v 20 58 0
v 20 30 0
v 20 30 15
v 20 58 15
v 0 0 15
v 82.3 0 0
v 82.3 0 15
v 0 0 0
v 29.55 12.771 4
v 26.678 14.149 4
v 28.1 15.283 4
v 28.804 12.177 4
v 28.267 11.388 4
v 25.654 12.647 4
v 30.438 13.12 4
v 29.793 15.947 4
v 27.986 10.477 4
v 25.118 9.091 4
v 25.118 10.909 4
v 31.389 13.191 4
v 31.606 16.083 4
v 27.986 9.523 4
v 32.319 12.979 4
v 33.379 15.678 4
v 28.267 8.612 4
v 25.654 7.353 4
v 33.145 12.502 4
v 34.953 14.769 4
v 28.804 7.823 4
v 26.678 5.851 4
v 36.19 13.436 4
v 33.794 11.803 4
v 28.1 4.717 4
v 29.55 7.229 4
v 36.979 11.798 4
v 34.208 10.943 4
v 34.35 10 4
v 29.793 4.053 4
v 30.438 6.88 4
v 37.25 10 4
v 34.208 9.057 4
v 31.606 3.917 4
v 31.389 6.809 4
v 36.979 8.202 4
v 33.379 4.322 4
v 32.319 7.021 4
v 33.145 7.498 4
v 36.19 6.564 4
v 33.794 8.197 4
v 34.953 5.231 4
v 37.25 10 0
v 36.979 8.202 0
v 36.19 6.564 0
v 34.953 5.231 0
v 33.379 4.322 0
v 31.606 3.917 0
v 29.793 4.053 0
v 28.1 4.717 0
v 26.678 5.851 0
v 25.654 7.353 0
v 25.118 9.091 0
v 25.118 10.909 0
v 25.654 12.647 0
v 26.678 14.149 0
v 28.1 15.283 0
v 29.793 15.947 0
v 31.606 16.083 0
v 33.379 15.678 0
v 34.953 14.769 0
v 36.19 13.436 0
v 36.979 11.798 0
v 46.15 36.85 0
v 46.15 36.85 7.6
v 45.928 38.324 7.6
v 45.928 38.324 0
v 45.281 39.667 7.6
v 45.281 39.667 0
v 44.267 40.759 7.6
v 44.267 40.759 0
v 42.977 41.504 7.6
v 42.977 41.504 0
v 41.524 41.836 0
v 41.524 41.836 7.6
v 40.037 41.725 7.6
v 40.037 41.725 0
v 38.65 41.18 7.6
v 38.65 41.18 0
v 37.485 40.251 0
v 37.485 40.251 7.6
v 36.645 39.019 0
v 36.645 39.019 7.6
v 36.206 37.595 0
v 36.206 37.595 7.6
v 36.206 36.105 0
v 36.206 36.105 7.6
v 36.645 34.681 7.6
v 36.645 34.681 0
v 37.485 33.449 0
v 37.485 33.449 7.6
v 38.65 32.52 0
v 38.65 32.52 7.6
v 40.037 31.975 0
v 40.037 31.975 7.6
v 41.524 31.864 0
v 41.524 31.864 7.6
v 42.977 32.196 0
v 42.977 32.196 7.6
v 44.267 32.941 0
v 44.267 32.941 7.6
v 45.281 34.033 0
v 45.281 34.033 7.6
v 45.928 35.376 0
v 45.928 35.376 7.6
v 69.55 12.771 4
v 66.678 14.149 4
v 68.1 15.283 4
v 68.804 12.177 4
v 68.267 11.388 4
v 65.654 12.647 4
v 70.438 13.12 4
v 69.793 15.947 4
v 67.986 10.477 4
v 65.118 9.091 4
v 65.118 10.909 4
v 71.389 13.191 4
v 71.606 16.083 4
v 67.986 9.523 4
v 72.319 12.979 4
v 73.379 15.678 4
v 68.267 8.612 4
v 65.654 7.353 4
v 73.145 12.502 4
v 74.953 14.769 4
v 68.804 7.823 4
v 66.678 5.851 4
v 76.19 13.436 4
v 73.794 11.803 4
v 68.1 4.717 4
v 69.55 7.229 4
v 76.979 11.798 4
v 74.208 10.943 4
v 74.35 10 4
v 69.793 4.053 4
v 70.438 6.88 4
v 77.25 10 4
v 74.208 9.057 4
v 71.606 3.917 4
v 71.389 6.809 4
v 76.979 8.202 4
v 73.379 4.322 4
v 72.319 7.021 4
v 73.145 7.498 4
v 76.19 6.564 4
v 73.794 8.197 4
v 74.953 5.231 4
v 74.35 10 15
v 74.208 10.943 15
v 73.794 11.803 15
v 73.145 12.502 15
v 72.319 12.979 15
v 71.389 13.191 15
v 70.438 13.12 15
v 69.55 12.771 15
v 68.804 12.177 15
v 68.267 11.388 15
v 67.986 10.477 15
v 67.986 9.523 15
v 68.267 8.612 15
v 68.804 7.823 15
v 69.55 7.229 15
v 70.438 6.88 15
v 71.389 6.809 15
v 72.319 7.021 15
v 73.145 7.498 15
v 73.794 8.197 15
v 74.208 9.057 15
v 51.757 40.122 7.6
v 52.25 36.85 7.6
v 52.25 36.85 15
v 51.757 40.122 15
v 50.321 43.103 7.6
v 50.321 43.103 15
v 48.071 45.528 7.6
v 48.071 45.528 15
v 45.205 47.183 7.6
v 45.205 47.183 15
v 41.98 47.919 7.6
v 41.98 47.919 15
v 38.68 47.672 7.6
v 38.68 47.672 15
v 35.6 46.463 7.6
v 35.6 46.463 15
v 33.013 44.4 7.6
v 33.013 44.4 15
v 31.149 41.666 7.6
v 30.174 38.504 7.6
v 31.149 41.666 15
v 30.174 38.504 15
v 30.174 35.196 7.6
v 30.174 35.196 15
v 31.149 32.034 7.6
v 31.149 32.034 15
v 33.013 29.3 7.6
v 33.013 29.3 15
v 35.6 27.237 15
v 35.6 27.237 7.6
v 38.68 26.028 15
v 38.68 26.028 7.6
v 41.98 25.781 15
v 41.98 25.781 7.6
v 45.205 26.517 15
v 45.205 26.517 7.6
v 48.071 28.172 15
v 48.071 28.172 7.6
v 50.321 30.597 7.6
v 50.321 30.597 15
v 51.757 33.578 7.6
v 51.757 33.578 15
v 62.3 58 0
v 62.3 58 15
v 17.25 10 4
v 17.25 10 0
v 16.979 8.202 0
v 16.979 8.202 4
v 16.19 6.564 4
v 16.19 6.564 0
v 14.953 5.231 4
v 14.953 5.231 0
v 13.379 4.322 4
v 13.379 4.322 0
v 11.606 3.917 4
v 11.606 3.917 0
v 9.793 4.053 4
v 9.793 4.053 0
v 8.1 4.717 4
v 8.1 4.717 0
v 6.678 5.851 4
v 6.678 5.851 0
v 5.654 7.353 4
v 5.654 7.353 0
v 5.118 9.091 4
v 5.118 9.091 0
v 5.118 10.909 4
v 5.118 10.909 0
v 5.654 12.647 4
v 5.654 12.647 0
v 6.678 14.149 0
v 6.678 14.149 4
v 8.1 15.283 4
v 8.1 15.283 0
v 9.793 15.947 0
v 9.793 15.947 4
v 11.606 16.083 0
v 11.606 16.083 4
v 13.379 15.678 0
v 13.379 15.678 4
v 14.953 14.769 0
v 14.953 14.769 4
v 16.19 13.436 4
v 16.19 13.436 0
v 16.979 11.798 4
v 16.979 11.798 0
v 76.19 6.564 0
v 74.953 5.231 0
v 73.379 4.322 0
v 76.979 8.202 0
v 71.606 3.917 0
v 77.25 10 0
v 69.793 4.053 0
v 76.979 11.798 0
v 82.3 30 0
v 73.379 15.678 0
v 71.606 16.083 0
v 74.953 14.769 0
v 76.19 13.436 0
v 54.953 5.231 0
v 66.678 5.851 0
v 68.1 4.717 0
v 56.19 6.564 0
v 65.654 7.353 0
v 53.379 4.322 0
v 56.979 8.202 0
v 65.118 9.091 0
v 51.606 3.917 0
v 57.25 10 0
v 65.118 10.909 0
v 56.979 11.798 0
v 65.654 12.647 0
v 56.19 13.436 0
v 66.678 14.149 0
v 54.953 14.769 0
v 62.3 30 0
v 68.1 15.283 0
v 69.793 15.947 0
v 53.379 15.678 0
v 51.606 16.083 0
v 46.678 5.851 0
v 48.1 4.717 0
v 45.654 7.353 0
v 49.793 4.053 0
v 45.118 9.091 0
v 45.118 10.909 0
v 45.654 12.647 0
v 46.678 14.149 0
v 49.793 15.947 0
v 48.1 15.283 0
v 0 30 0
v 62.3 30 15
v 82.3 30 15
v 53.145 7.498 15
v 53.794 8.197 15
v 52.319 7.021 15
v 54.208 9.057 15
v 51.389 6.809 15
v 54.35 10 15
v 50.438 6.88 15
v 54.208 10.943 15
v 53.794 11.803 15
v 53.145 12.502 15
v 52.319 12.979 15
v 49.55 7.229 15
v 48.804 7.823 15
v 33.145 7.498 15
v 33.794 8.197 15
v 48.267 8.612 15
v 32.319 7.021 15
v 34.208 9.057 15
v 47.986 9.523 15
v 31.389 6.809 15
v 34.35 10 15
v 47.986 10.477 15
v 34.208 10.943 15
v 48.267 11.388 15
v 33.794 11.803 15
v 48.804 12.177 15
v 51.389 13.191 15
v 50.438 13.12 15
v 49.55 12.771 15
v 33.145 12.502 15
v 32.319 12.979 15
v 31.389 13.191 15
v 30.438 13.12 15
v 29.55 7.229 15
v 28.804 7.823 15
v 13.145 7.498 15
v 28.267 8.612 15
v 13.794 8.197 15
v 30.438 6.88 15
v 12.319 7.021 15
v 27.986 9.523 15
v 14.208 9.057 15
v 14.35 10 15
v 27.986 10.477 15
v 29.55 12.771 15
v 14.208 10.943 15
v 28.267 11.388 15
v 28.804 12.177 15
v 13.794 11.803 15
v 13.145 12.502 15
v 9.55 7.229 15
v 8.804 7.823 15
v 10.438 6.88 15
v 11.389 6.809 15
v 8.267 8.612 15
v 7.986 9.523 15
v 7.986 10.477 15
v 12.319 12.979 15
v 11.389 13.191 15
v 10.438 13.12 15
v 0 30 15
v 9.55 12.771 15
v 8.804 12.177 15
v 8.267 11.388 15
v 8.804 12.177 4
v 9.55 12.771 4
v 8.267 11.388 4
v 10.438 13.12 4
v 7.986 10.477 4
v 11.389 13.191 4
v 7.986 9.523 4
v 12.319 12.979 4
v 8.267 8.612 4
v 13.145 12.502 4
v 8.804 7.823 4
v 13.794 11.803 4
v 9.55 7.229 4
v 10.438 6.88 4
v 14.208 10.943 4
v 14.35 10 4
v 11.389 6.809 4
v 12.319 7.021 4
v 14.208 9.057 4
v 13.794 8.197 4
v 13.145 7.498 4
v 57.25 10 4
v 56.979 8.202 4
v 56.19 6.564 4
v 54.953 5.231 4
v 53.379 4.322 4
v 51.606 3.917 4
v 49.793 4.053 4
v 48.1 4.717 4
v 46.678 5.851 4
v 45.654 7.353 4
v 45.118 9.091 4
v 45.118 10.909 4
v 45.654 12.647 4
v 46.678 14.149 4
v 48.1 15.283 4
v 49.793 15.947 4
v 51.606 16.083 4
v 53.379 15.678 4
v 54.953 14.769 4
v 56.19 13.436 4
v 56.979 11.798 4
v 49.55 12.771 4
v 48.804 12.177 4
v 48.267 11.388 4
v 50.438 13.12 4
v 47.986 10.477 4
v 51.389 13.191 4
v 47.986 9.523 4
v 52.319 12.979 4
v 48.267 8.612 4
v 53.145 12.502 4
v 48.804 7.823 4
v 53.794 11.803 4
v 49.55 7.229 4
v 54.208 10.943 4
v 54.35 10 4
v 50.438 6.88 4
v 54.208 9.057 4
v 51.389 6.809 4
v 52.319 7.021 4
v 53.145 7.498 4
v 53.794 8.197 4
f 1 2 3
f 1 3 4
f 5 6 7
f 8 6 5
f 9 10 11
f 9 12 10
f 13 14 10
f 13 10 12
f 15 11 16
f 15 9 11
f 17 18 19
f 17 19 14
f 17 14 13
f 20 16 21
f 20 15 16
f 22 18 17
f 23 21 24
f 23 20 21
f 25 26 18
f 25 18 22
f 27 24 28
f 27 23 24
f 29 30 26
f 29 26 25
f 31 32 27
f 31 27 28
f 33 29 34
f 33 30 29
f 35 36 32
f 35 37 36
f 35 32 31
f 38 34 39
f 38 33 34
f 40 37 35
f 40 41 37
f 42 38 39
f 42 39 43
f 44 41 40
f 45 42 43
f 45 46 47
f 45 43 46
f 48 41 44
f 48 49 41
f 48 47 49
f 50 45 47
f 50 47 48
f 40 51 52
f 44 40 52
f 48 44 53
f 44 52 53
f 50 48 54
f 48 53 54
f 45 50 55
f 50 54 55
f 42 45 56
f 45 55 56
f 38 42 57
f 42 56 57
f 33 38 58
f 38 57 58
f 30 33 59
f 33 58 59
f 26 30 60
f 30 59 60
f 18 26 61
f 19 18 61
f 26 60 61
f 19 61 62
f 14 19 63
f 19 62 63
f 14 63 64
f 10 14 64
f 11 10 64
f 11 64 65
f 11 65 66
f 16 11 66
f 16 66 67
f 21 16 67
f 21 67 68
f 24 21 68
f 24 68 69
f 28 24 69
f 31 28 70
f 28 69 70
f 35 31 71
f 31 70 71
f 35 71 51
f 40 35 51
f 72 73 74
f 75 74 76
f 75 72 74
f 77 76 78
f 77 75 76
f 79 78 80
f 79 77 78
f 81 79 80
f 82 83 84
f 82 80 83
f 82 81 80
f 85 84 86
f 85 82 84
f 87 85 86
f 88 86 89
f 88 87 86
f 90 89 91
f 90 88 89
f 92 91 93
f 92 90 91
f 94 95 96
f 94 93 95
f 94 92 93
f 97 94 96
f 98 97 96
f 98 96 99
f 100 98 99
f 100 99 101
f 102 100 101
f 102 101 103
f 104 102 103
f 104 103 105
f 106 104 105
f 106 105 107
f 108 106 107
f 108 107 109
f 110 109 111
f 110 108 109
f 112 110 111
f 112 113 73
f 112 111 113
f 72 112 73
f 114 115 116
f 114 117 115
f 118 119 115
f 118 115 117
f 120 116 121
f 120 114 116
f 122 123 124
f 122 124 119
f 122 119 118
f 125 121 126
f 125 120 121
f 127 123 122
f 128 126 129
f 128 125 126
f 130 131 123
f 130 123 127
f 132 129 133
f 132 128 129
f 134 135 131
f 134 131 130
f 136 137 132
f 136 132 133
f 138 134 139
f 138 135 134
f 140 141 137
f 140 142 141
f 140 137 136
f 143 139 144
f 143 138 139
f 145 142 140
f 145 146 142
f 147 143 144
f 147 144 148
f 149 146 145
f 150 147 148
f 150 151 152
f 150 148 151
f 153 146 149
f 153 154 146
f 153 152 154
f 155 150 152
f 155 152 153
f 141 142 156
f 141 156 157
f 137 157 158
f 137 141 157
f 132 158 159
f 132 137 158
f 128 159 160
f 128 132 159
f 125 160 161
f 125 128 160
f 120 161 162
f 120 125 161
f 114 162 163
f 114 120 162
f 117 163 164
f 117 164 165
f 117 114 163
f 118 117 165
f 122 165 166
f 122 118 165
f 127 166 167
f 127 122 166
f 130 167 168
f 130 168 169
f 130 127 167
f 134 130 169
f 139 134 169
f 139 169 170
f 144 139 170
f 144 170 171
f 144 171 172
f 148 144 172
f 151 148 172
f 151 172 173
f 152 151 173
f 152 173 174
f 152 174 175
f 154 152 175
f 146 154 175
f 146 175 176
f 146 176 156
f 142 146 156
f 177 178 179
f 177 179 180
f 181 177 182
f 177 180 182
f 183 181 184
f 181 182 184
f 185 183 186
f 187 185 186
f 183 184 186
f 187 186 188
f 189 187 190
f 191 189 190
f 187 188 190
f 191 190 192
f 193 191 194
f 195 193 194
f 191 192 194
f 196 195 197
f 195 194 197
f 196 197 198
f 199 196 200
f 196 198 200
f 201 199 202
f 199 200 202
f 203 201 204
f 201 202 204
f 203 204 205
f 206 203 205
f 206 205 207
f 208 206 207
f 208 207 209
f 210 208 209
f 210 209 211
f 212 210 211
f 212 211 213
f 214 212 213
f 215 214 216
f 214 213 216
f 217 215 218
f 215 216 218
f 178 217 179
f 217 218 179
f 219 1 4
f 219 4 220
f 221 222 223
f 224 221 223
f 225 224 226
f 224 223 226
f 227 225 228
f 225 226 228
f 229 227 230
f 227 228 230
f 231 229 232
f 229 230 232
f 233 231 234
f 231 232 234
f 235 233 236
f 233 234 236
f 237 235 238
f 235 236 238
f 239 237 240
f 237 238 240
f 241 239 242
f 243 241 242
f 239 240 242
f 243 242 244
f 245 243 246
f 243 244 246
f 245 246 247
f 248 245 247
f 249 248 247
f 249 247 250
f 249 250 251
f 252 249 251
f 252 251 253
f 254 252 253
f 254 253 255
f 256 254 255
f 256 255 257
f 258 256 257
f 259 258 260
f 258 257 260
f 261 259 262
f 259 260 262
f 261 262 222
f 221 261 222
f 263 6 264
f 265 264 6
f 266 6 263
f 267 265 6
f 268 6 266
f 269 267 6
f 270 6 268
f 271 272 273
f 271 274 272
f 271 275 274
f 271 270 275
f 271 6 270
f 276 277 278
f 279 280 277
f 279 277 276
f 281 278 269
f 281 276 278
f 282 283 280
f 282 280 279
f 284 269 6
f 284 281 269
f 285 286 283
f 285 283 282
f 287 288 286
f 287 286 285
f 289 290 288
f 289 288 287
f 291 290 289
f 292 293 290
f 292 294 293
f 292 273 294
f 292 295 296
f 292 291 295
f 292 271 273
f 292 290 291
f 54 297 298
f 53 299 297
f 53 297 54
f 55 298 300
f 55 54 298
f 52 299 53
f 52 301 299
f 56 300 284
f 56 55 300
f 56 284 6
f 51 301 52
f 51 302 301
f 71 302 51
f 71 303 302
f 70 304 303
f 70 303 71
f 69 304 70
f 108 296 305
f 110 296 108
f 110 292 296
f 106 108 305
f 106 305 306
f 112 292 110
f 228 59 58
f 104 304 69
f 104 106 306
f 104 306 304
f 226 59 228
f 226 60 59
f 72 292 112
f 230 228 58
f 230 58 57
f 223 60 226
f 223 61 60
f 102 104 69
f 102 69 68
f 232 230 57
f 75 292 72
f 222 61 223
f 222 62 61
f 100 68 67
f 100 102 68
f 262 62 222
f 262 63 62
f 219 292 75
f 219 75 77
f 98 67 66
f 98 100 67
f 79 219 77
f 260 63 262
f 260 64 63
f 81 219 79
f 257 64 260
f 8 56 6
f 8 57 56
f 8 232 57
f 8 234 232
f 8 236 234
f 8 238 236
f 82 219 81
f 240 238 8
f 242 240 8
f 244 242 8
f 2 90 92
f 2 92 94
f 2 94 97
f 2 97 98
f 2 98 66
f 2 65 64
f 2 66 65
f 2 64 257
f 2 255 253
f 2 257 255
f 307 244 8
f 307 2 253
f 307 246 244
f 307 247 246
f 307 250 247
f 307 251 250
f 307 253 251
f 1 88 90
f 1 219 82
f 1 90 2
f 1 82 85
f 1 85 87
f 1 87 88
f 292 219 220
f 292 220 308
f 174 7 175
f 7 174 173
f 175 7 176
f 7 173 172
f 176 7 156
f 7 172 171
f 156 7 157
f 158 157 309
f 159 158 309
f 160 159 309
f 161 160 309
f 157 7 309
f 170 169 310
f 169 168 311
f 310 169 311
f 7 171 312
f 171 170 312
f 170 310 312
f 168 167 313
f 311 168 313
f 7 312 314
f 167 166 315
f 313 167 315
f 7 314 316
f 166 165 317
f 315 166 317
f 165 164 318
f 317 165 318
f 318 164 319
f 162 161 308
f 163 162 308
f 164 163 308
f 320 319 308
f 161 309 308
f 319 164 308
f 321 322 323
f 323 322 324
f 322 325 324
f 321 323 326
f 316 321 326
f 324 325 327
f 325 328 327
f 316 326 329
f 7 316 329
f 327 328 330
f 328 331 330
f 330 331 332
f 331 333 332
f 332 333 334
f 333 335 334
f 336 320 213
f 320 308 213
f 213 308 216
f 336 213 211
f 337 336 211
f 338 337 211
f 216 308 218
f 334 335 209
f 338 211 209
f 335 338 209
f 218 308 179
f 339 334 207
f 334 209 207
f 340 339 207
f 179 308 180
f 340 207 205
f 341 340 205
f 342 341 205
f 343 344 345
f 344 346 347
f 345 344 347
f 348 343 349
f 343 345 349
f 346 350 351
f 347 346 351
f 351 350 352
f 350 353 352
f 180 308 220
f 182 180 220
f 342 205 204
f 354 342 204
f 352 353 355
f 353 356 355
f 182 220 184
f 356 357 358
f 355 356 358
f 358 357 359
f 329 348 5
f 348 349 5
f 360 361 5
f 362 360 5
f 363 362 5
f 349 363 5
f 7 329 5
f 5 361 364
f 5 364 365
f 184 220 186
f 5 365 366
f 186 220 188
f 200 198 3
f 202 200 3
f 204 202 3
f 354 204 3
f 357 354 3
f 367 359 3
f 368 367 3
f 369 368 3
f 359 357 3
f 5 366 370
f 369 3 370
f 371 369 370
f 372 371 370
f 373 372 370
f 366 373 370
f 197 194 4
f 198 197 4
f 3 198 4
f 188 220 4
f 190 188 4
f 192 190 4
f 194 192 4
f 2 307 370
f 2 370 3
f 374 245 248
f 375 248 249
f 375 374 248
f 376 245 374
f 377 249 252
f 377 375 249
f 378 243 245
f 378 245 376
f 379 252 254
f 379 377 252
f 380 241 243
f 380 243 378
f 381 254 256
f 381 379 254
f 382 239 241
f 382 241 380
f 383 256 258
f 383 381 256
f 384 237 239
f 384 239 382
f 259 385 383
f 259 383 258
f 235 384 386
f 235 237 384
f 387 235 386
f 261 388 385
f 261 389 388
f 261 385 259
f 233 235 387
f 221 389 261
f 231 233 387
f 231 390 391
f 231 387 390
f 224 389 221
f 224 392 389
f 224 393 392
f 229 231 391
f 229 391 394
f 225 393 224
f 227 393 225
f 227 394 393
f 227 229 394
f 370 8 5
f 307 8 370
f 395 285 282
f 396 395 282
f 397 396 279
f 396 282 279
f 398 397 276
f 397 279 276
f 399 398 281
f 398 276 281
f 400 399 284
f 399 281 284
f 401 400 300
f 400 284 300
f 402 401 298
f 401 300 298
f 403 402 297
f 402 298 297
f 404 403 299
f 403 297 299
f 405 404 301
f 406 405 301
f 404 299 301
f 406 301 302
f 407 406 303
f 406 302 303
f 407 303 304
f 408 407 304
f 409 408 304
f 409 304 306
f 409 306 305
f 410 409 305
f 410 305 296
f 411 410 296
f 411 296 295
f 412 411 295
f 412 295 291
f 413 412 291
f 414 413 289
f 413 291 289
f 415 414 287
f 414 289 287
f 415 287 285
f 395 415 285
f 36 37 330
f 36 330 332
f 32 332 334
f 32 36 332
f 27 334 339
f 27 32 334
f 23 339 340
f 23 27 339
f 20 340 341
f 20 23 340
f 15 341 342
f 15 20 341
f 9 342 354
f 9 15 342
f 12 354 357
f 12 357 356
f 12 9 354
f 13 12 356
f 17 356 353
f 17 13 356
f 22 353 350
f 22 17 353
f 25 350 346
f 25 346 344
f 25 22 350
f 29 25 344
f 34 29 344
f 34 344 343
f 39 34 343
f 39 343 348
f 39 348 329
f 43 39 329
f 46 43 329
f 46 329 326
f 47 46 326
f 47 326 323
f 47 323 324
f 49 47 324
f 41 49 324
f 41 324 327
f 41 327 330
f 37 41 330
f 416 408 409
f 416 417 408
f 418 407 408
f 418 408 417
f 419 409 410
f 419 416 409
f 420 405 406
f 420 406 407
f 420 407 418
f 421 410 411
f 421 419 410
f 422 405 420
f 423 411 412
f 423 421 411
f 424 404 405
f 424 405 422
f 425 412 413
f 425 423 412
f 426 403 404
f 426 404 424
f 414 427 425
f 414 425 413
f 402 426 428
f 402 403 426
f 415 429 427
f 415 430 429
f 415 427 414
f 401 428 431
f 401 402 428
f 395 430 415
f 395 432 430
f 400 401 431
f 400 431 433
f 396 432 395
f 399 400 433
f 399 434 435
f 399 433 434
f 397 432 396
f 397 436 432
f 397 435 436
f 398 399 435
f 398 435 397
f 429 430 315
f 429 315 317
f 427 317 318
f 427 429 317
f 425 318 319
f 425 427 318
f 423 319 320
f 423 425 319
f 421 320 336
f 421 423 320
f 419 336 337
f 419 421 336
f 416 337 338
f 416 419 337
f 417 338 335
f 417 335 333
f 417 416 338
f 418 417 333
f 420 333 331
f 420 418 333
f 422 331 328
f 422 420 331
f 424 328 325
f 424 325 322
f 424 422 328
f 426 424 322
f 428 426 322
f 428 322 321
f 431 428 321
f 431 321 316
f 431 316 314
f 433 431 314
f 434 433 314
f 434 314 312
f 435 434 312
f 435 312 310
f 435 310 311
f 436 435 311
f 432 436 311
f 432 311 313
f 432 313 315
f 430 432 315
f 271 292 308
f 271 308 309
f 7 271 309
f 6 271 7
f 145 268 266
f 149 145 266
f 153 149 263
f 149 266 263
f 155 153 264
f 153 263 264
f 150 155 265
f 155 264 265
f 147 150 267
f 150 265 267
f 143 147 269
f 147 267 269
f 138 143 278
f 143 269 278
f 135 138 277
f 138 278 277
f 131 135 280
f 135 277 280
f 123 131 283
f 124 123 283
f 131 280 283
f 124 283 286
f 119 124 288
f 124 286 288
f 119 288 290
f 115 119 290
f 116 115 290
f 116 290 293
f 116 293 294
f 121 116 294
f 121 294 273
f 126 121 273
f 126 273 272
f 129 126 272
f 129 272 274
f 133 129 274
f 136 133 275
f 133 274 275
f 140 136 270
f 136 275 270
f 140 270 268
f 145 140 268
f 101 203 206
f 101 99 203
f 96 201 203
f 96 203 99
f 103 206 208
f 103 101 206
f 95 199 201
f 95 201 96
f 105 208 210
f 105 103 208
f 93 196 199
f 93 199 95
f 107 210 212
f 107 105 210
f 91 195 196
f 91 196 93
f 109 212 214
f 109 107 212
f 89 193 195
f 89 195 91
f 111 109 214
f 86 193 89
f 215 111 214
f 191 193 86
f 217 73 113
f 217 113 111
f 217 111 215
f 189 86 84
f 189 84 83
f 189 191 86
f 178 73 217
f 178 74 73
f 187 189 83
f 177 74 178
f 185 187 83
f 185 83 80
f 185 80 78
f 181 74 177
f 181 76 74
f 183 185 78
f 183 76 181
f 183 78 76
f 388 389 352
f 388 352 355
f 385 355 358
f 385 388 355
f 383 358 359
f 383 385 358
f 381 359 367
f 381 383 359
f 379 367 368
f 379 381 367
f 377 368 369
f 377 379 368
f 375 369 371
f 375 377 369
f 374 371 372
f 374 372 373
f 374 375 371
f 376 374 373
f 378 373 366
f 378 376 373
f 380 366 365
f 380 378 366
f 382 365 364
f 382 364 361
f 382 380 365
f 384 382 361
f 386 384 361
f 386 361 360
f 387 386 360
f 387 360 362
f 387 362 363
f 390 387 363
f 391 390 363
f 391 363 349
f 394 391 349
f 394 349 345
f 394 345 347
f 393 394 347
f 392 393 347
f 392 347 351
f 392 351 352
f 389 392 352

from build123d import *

# Parameters (mm, degrees)
SKETCH_R        = 5
SKETCH_R_2      = 3.2
PAD_DEPTH       = 15
SKETCH002_R     = 6.1
POCKET001_DEPTH = 4
SKETCH003_R     = 11.1
POCKET_DEPTH    = 7.4


with BuildPart() as part:
    # Sketch → Pad (new body)
    with BuildSketch(Plane.XY):
        Polygon((20, 30), (20, 58), (62.3, 58), (62.3, 30), (82.3, 30), (82.3, 0), (0, 0), (0, 30), align=None)
        with Locations((41.15, 36.85)):
            Circle(SKETCH_R, mode=Mode.SUBTRACT)
        with Locations((11.15, 10)):
            Circle(SKETCH_R_2, mode=Mode.SUBTRACT)
        with Locations((31.15, 10)):
            Circle(SKETCH_R_2, mode=Mode.SUBTRACT)
        with Locations((51.15, 10)):
            Circle(SKETCH_R_2, mode=Mode.SUBTRACT)
        with Locations((71.15, 10)):
            Circle(SKETCH_R_2, mode=Mode.SUBTRACT)
    extrude(amount=PAD_DEPTH)

    # Sketch002 → Pocket001 (cut)
    with BuildSketch(Plane(origin=(0, 0, 0), x_dir=(1, 0, 0), z_dir=(0, 0, -1))):
        with Locations((11.15, -10)):
            Circle(SKETCH002_R)
        with Locations((31.15, -10)):
            Circle(SKETCH002_R)
        with Locations((51.15, -10)):
            Circle(SKETCH002_R)
        with Locations((71.15, -10)):
            Circle(SKETCH002_R)
    extrude(amount=-POCKET001_DEPTH, mode=Mode.SUBTRACT)

    # Sketch003 (on Face5 of Pocket001) → Pocket (cut)
    with BuildSketch(Plane.XY.offset(15)):
        with Locations((41.15, 36.85)):
            Circle(SKETCH003_R)
    extrude(amount=-POCKET_DEPTH, mode=Mode.SUBTRACT)


solid = part.part
